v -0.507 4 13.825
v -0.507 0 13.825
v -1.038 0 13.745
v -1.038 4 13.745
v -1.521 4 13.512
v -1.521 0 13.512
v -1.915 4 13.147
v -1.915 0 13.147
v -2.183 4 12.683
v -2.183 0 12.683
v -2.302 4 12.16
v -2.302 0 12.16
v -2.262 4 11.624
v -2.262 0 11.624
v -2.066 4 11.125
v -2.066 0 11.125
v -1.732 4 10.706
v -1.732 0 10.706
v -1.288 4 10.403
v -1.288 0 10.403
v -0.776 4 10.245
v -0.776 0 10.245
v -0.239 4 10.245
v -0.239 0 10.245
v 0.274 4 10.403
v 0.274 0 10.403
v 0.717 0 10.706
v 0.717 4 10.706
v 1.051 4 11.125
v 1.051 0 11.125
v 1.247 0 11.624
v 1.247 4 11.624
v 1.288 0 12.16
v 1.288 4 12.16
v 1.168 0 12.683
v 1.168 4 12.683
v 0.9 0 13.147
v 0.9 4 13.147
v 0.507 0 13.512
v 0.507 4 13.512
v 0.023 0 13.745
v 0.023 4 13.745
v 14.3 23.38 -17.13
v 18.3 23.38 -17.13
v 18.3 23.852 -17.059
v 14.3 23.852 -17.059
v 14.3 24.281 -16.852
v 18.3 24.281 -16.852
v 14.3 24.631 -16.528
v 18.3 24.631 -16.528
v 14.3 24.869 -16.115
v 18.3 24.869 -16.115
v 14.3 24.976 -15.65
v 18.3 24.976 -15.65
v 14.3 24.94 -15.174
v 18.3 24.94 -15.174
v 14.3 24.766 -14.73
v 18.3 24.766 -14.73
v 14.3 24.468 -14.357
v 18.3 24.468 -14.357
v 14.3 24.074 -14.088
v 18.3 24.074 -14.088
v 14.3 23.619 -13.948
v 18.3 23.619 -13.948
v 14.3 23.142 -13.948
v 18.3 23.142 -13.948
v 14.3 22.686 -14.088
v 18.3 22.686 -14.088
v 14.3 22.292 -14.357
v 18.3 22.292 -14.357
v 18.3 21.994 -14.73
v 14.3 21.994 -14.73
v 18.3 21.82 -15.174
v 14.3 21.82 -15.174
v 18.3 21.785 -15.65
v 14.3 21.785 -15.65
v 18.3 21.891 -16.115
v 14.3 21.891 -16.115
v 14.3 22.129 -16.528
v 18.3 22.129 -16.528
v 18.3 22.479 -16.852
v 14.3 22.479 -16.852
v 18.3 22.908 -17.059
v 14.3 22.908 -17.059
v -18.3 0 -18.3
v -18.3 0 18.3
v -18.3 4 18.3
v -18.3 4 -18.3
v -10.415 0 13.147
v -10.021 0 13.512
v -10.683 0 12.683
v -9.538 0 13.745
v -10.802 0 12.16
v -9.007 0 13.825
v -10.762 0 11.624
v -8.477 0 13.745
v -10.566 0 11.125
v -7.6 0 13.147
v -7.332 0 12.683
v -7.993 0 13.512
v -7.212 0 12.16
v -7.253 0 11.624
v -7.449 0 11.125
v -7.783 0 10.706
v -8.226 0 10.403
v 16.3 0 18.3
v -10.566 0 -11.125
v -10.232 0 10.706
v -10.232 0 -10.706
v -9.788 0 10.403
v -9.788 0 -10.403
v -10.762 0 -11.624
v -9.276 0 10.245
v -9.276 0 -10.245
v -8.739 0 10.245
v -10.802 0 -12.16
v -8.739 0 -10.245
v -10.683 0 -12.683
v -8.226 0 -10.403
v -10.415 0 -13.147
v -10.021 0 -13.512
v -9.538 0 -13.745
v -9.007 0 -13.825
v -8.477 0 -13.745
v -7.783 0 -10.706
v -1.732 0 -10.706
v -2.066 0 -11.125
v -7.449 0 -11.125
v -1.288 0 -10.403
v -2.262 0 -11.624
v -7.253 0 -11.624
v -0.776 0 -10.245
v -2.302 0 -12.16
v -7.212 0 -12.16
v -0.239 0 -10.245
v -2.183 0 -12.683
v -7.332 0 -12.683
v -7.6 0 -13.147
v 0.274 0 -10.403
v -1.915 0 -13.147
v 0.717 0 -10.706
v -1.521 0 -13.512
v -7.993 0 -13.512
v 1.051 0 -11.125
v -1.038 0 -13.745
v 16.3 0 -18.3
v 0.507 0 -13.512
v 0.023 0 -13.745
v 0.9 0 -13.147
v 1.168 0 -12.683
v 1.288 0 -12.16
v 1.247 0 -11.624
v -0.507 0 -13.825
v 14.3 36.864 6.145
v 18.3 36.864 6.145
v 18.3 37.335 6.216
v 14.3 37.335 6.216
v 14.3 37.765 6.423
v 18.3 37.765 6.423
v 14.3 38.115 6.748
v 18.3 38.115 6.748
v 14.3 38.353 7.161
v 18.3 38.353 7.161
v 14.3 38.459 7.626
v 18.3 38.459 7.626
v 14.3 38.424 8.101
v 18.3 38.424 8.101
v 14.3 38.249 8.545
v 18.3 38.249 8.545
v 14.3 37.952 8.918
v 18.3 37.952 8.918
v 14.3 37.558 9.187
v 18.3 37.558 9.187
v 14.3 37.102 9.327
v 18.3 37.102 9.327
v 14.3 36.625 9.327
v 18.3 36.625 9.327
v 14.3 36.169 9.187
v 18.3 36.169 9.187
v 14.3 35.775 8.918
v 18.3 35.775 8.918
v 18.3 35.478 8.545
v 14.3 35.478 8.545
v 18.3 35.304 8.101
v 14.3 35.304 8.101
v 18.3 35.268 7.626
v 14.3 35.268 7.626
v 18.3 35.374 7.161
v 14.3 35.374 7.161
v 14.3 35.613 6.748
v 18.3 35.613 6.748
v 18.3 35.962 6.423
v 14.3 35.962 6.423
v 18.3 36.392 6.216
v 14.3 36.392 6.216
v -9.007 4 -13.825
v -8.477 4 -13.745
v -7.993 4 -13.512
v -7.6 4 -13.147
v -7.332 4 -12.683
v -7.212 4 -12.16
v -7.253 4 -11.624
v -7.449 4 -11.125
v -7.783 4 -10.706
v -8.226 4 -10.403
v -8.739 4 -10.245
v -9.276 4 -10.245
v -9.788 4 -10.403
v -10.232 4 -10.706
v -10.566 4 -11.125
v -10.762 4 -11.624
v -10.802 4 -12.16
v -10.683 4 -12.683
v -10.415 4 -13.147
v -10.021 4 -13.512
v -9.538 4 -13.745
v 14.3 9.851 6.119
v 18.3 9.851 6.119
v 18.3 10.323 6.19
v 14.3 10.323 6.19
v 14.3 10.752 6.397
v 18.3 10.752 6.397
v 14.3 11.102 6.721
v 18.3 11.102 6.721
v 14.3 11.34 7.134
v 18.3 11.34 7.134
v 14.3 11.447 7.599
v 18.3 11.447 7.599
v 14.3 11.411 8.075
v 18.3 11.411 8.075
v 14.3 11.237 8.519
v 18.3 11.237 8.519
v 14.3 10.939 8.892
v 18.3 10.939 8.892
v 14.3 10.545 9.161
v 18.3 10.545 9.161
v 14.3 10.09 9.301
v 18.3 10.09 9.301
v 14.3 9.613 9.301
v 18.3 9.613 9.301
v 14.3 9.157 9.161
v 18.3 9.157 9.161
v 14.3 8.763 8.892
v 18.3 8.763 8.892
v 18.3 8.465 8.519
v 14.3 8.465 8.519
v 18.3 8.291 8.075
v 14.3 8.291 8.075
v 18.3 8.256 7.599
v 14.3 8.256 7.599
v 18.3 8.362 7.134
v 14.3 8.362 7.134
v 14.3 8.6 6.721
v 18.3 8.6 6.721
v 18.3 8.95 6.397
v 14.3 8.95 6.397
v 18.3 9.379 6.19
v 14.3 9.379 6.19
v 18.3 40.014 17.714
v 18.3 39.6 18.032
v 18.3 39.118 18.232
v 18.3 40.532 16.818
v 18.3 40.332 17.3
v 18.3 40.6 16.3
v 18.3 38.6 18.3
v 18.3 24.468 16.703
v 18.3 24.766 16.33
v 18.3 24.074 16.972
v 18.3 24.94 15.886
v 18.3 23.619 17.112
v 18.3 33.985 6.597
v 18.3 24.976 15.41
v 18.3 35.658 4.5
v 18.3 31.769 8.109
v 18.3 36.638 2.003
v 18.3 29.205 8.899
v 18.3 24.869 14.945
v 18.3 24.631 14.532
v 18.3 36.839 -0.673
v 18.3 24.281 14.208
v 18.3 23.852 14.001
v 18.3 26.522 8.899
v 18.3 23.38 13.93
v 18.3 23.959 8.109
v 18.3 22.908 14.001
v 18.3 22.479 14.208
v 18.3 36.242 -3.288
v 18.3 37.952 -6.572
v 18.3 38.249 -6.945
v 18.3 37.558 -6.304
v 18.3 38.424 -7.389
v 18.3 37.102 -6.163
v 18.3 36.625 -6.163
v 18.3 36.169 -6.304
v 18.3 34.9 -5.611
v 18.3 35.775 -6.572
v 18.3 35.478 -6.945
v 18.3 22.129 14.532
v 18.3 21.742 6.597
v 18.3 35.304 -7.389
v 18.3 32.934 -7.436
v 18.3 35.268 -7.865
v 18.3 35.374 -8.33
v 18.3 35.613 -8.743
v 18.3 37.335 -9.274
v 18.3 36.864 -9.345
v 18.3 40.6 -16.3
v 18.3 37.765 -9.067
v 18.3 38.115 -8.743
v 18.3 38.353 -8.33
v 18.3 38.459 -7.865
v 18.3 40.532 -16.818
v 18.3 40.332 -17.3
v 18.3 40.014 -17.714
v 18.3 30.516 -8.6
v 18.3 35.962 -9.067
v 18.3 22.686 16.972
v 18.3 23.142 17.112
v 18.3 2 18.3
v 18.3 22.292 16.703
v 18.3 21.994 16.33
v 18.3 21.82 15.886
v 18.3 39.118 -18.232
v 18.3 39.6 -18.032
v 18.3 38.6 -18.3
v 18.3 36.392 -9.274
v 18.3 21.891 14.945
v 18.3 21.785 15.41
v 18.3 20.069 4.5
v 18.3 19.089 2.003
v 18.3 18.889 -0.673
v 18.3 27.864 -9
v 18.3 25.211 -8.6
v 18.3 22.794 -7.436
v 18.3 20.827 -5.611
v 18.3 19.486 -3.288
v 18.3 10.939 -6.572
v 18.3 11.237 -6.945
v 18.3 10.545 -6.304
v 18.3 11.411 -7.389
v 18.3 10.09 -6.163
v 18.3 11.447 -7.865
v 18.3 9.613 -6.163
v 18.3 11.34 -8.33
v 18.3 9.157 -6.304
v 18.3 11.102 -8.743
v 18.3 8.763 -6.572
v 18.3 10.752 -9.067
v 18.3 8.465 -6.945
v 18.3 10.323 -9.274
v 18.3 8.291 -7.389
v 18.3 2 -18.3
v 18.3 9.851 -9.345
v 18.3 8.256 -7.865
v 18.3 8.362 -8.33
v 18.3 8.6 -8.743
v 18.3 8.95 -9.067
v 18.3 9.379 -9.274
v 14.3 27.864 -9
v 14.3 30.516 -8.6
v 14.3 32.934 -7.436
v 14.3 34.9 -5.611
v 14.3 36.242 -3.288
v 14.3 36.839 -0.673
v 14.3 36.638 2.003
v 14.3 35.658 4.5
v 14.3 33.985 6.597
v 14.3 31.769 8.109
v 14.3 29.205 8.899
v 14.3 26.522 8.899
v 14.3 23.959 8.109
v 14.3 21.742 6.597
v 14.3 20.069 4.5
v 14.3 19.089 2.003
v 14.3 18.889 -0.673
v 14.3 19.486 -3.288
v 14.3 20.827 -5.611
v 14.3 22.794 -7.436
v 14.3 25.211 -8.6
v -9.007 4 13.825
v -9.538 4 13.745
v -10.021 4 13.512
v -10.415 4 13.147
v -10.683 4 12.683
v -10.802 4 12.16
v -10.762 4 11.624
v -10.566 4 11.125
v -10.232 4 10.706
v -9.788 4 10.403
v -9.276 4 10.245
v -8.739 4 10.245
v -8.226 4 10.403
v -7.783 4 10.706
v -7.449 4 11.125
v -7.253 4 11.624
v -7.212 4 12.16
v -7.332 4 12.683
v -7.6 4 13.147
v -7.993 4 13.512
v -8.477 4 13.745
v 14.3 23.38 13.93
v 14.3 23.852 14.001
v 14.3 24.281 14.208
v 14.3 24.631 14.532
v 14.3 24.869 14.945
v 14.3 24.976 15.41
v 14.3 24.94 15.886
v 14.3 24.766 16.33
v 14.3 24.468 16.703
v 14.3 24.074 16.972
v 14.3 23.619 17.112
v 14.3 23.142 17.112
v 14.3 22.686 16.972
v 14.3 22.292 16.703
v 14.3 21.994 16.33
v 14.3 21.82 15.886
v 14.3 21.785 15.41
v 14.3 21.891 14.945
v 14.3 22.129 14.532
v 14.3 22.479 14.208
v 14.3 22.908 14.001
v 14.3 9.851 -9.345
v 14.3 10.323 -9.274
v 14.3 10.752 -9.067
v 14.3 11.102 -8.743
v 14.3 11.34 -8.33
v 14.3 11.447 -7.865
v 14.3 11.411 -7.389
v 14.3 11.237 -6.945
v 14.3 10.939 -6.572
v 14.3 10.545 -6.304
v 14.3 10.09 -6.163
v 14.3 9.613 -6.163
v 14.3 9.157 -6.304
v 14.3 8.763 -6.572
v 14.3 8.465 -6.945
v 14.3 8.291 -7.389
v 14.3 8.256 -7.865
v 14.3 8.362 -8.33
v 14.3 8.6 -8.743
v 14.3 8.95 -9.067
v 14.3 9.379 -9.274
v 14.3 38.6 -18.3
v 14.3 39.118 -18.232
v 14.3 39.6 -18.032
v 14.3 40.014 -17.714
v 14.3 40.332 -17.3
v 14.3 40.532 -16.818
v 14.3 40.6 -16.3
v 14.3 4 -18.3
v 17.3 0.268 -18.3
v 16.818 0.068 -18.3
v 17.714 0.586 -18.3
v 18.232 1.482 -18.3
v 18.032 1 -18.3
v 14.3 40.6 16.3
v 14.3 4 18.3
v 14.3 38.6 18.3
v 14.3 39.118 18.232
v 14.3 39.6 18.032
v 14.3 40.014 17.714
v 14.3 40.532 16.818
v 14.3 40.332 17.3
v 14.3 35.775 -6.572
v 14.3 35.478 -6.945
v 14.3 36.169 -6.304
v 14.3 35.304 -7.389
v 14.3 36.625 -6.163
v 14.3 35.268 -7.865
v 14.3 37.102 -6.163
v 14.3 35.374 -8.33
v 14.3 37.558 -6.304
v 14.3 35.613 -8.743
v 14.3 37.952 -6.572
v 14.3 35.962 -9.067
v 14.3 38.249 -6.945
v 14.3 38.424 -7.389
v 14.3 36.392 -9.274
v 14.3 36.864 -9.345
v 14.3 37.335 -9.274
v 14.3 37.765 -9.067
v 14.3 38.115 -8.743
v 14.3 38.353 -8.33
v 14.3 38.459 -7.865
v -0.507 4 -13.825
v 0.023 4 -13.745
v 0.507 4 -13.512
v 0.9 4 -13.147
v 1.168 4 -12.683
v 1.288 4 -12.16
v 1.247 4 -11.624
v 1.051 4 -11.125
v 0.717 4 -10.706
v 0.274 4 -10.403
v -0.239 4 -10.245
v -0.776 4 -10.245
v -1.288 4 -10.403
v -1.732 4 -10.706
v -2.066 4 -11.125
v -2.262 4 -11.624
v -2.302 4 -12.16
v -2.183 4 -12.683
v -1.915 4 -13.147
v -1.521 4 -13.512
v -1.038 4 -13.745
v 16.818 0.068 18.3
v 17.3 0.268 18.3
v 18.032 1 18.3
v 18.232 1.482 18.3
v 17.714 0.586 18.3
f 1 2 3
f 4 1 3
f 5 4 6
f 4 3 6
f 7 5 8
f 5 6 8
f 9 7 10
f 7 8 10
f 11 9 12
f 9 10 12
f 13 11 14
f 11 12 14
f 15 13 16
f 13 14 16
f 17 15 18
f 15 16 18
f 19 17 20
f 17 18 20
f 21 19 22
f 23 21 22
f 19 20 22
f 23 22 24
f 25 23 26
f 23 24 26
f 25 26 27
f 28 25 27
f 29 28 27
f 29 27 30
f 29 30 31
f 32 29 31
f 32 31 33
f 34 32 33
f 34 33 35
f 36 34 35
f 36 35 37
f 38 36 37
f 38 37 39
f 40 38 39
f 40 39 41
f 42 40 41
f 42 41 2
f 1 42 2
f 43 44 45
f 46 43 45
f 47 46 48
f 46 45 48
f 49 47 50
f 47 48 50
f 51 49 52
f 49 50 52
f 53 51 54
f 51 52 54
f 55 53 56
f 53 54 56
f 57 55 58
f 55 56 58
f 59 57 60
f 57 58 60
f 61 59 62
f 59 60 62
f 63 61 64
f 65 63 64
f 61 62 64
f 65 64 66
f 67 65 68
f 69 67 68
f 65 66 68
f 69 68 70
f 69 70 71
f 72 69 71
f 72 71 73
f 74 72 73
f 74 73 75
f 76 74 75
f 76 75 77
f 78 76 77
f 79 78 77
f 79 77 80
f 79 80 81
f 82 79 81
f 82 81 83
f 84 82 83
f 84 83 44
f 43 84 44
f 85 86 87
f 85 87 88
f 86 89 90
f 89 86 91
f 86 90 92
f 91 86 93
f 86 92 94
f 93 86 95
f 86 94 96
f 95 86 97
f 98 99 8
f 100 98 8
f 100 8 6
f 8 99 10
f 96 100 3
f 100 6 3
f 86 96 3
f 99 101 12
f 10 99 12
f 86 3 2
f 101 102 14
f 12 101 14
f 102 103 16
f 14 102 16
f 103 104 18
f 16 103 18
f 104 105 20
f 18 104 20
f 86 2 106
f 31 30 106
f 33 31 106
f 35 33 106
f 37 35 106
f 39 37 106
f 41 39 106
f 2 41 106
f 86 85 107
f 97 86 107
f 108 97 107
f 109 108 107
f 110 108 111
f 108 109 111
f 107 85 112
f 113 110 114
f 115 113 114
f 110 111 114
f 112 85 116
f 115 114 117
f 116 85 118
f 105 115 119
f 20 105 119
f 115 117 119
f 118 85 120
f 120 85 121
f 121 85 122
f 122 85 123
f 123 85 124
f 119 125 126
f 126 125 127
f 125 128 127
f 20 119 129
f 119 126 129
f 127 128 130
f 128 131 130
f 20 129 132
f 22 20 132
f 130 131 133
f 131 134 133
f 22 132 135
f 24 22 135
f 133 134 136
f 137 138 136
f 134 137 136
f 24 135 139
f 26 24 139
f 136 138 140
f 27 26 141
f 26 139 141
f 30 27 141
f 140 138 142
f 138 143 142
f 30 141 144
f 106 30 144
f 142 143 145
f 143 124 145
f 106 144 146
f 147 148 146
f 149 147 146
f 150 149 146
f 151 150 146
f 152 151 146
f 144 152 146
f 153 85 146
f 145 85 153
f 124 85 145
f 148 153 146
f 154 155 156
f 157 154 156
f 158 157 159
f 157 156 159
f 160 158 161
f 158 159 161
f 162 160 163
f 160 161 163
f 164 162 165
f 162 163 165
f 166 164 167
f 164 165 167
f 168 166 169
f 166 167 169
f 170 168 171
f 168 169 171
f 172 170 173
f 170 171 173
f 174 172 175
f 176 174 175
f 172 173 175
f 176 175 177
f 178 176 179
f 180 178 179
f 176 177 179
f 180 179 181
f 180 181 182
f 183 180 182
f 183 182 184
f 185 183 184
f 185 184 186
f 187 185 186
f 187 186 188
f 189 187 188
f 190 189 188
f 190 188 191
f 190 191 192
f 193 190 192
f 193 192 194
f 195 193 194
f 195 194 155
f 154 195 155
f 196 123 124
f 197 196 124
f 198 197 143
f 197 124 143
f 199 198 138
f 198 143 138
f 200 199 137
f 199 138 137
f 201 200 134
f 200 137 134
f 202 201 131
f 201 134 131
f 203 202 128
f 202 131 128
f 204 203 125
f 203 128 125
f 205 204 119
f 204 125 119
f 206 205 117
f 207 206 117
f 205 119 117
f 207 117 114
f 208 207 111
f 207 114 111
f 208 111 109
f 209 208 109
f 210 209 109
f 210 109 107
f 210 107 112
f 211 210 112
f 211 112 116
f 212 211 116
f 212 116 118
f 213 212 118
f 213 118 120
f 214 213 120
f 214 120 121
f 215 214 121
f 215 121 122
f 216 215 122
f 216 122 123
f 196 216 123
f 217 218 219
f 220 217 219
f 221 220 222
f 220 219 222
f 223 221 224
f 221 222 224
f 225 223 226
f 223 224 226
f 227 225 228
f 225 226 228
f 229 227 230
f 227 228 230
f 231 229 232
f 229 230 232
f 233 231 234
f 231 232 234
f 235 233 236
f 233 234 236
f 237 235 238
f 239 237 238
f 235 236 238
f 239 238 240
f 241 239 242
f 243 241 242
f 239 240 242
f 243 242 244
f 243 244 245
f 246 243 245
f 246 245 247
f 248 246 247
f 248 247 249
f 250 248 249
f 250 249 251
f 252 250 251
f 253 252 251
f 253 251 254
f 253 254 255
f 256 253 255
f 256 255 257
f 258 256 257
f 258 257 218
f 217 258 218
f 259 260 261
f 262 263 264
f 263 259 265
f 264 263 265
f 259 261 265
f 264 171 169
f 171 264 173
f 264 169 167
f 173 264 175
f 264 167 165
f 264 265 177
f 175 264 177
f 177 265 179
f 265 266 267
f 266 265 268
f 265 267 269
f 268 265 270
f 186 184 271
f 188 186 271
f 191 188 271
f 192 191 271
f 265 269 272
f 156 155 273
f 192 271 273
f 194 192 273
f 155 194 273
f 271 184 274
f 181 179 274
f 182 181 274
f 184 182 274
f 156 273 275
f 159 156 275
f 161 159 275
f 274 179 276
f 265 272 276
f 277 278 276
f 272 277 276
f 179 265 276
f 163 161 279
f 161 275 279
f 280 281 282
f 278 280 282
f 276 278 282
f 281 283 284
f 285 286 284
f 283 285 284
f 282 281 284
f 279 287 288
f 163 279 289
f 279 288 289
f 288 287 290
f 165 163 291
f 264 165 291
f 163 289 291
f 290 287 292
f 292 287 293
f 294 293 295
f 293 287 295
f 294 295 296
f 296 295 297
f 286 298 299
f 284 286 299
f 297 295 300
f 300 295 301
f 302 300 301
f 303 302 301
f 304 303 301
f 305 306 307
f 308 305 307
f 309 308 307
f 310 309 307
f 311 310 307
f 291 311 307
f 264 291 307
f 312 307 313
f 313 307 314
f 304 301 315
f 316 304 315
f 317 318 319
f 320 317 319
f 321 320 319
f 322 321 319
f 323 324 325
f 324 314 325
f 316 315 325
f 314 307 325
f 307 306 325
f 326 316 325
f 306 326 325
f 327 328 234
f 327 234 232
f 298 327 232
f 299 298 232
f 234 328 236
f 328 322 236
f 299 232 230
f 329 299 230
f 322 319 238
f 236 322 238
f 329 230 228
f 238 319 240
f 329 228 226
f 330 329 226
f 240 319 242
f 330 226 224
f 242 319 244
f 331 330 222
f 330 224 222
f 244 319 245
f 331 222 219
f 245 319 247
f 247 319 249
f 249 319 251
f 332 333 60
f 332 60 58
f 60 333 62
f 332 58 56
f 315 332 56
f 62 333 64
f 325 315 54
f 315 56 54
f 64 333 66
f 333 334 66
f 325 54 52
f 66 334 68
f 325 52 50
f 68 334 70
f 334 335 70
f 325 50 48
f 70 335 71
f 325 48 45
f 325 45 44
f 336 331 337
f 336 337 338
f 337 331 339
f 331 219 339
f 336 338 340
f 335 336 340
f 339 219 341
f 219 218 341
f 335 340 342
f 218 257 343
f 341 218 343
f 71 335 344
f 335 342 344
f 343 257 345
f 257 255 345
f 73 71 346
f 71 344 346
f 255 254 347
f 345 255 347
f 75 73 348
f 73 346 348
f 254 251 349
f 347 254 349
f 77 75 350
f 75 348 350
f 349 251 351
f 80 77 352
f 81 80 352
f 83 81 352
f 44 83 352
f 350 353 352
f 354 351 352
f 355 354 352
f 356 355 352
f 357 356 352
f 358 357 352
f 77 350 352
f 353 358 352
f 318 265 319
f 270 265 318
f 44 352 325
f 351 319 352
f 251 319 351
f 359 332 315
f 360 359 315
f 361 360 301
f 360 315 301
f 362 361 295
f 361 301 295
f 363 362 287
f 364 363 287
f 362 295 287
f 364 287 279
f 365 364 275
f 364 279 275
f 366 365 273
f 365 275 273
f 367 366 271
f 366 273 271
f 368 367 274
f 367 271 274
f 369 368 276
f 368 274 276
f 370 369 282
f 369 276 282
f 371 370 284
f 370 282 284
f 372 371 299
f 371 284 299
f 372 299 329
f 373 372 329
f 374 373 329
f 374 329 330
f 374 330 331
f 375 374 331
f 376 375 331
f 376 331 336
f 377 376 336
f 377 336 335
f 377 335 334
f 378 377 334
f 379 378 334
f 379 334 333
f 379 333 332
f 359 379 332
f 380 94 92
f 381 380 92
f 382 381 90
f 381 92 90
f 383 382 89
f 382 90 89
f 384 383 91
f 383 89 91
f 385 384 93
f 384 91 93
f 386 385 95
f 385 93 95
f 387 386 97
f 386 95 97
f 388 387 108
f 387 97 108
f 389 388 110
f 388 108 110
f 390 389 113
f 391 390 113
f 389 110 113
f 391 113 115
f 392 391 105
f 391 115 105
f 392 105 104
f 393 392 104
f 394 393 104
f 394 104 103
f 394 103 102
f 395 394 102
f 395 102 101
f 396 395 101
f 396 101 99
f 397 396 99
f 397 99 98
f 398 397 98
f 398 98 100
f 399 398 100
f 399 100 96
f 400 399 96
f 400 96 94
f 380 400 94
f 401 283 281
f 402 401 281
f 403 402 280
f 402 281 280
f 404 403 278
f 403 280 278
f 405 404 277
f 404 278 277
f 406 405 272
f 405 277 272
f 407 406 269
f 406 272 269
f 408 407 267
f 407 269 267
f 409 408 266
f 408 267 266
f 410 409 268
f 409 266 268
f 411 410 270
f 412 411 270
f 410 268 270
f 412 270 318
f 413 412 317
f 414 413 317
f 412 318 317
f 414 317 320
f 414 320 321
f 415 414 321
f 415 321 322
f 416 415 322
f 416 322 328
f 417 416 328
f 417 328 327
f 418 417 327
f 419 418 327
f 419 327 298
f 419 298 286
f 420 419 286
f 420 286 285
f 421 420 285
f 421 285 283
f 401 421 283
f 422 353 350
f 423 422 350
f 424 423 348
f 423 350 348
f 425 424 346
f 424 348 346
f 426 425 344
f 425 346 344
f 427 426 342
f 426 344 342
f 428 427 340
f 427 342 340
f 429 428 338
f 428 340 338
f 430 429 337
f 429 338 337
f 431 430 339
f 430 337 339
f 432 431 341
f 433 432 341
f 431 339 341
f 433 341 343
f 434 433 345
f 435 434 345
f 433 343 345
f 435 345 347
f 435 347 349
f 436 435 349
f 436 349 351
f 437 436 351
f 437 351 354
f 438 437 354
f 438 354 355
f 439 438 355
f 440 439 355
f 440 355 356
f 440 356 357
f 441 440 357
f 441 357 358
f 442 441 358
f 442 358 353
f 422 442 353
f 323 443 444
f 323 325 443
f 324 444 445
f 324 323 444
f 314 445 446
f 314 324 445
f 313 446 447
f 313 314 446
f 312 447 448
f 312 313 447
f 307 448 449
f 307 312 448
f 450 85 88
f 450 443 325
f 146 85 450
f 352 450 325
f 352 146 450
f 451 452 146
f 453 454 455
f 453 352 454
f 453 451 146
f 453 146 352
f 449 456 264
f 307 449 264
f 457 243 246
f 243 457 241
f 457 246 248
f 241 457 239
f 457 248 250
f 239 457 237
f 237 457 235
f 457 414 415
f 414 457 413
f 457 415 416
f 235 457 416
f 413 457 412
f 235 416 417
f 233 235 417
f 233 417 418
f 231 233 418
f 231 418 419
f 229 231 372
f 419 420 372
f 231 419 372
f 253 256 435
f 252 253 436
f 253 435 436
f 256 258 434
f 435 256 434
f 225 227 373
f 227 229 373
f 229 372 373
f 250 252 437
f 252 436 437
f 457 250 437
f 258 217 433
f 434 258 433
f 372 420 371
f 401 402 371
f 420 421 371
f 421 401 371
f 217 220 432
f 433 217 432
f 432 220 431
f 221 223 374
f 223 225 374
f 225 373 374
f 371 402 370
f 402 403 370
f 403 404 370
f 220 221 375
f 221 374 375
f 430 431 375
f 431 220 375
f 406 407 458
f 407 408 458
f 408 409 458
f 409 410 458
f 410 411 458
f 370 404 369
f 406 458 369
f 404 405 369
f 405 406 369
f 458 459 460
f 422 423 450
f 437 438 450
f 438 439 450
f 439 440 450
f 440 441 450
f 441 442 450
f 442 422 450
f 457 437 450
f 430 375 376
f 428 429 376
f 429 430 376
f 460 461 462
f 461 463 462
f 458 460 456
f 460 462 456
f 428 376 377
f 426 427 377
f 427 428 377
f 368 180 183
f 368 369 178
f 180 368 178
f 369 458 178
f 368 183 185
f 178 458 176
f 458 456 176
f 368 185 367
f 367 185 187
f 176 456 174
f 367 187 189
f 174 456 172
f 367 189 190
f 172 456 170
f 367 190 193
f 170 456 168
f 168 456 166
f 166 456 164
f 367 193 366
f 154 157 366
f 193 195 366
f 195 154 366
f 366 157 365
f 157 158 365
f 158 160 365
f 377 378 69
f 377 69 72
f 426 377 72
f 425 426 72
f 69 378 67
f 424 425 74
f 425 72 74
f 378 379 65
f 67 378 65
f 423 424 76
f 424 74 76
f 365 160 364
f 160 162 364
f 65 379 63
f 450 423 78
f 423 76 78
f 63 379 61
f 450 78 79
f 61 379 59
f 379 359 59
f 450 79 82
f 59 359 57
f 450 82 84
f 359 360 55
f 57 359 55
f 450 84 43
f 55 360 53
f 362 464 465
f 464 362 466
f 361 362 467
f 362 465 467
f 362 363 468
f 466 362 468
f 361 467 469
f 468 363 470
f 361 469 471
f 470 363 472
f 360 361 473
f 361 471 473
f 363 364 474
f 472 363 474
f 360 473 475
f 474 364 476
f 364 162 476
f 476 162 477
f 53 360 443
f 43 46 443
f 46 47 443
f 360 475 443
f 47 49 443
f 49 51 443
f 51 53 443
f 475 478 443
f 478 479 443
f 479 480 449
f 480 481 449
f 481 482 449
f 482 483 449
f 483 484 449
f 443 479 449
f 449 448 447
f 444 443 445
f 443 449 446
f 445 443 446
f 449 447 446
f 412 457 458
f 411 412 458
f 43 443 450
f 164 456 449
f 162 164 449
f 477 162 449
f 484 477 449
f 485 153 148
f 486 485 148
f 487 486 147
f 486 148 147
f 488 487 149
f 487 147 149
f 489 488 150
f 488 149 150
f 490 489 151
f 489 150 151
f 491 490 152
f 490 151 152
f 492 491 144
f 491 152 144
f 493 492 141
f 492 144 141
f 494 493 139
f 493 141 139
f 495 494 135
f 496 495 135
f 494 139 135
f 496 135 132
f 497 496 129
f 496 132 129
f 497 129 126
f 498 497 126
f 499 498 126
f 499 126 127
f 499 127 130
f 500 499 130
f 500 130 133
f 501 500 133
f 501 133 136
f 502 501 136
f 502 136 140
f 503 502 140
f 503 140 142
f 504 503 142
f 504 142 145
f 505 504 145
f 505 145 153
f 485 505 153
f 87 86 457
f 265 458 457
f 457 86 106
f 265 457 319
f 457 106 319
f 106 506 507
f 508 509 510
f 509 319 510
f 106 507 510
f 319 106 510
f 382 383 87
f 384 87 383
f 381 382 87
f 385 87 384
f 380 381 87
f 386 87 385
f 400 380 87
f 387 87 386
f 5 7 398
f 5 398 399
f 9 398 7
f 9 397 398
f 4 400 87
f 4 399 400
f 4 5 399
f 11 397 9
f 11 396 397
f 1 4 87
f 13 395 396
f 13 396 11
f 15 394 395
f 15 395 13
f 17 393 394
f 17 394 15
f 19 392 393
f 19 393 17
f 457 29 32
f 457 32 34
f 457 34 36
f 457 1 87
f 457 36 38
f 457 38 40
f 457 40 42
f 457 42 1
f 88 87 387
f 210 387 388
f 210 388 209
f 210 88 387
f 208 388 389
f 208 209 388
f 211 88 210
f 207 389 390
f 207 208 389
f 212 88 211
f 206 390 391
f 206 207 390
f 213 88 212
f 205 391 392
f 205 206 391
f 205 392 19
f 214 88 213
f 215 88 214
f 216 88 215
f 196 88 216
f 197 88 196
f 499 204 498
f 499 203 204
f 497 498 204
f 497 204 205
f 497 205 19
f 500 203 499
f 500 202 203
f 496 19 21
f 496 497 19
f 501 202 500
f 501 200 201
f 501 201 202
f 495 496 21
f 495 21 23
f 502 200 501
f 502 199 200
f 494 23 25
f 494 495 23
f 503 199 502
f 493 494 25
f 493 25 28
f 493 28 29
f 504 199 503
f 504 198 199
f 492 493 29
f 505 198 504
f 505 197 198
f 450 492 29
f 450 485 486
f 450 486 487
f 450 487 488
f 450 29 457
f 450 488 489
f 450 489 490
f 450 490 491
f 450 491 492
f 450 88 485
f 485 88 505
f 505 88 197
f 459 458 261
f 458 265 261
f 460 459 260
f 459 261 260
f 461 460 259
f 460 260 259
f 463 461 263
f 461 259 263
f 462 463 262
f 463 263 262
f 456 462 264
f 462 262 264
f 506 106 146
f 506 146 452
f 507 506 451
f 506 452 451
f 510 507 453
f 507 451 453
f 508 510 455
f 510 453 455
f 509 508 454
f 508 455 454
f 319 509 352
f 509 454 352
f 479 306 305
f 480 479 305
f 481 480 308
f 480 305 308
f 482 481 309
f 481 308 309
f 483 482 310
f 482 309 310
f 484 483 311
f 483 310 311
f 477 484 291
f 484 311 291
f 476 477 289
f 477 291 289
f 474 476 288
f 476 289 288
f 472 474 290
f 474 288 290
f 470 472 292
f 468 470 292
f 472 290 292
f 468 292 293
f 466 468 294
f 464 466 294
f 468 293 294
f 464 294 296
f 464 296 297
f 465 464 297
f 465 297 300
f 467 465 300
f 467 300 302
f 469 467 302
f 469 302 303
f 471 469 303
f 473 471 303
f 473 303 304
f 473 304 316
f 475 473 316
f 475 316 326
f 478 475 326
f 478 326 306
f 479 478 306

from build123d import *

# Parameters (mm, degrees)
SKETCH_1_W          = 36.6
SKETCH_1_H          = 36.6
EXTRUDE_1_DEPTH     = 40.6
SKETCH_2_W          = 32.6
SKETCH_2_H          = 36.6
CUT_EXTRUDE_1_DEPTH = 36.6
SKETCH_3_R          = 9
SKETCH_3_R_2        = 1.6
CUT_EXTRUDE_5_DEPTH = 36.6
FILLET_1_R          = 2
FILLET_2_R          = 2
SKETCH_7_R          = 1.8
CUT_EXTRUDE_6_DEPTH = 10


with BuildPart() as part:
    # 草图1 → 凸台-拉伸1 (new body)
    with BuildSketch(Plane(origin=(0, 0, 0), x_dir=(1, 0, 0), z_dir=(0, 1, 0))):
        Rectangle(SKETCH_1_W, SKETCH_1_H)
    extrude(amount=EXTRUDE_1_DEPTH)

    # 草图2 → 切除-拉伸1 (cut)
    with BuildSketch(Plane(origin=(0, 40.6, 0), x_dir=(1, 0, 0), z_dir=(0, 1, 0))):
        with Locations((-2, 0)):
            Rectangle(SKETCH_2_W, SKETCH_2_H)
    extrude(amount=-CUT_EXTRUDE_1_DEPTH, mode=Mode.SUBTRACT)

    # 草图3 → 切除-拉伸5 (cut)
    with BuildSketch(Plane(origin=(18.3, 0, 0), x_dir=(0, 0, -1), z_dir=(1, 0, 0))):
        with Locations((0, 27.863666333)):
            Circle(SKETCH_3_R)
        with Locations((-7.745235234, 36.863666333)):
            Circle(SKETCH_3_R_2)
        with Locations((7.745235234, 36.863666333)):
            Circle(SKETCH_3_R_2)
        with Locations((-15.529977583, 23.38009706)):
            Circle(SKETCH_3_R_2)
        with Locations((15.529977583, 23.38009706)):
            Circle(SKETCH_3_R_2)
        with Locations((7.745235234, 9.85104245)):
            Circle(SKETCH_3_R_2)
        with Locations((-7.718974262, 9.85104245)):
            Circle(SKETCH_3_R_2)
    extrude(amount=-CUT_EXTRUDE_5_DEPTH, mode=Mode.SUBTRACT)

    # 圆角1
    fillet_1_edges = [part.edges().sort_by_distance(p)[0] for p in [
        (18.3, 0, 0),
    ]]
    fillet(fillet_1_edges, radius=FILLET_1_R)

    # 圆角2
    fillet_2_edges = [part.edges().sort_by_distance(p)[0] for p in [
        (16.3, 40.6, 18.3),
        (16.3, 40.6, -18.3),
    ]]
    fillet(fillet_2_edges, radius=FILLET_2_R)

    # 草图7 → 切除-拉伸6 (cut)
    with BuildSketch(Plane(origin=(0, 0, 0), x_dir=(-1, 0, 0), z_dir=(0, -1, 0))):
        with Locations(Location((0.50738419, 12.025, 0), (0, 0, 90))):
            Circle(SKETCH_7_R)
        with Locations(Location((9.00738419, 12.025, 0), (0, 0, 90))):
            Circle(SKETCH_7_R)
        with Locations(Location((9.00738419, -12.025, 0), (0, 0, 270))):
            Circle(SKETCH_7_R)
        with Locations(Location((0.50738419, -12.025, 0), (0, 0, 270))):
            Circle(SKETCH_7_R)
    extrude(amount=-CUT_EXTRUDE_6_DEPTH, mode=Mode.SUBTRACT)


solid = part.part
